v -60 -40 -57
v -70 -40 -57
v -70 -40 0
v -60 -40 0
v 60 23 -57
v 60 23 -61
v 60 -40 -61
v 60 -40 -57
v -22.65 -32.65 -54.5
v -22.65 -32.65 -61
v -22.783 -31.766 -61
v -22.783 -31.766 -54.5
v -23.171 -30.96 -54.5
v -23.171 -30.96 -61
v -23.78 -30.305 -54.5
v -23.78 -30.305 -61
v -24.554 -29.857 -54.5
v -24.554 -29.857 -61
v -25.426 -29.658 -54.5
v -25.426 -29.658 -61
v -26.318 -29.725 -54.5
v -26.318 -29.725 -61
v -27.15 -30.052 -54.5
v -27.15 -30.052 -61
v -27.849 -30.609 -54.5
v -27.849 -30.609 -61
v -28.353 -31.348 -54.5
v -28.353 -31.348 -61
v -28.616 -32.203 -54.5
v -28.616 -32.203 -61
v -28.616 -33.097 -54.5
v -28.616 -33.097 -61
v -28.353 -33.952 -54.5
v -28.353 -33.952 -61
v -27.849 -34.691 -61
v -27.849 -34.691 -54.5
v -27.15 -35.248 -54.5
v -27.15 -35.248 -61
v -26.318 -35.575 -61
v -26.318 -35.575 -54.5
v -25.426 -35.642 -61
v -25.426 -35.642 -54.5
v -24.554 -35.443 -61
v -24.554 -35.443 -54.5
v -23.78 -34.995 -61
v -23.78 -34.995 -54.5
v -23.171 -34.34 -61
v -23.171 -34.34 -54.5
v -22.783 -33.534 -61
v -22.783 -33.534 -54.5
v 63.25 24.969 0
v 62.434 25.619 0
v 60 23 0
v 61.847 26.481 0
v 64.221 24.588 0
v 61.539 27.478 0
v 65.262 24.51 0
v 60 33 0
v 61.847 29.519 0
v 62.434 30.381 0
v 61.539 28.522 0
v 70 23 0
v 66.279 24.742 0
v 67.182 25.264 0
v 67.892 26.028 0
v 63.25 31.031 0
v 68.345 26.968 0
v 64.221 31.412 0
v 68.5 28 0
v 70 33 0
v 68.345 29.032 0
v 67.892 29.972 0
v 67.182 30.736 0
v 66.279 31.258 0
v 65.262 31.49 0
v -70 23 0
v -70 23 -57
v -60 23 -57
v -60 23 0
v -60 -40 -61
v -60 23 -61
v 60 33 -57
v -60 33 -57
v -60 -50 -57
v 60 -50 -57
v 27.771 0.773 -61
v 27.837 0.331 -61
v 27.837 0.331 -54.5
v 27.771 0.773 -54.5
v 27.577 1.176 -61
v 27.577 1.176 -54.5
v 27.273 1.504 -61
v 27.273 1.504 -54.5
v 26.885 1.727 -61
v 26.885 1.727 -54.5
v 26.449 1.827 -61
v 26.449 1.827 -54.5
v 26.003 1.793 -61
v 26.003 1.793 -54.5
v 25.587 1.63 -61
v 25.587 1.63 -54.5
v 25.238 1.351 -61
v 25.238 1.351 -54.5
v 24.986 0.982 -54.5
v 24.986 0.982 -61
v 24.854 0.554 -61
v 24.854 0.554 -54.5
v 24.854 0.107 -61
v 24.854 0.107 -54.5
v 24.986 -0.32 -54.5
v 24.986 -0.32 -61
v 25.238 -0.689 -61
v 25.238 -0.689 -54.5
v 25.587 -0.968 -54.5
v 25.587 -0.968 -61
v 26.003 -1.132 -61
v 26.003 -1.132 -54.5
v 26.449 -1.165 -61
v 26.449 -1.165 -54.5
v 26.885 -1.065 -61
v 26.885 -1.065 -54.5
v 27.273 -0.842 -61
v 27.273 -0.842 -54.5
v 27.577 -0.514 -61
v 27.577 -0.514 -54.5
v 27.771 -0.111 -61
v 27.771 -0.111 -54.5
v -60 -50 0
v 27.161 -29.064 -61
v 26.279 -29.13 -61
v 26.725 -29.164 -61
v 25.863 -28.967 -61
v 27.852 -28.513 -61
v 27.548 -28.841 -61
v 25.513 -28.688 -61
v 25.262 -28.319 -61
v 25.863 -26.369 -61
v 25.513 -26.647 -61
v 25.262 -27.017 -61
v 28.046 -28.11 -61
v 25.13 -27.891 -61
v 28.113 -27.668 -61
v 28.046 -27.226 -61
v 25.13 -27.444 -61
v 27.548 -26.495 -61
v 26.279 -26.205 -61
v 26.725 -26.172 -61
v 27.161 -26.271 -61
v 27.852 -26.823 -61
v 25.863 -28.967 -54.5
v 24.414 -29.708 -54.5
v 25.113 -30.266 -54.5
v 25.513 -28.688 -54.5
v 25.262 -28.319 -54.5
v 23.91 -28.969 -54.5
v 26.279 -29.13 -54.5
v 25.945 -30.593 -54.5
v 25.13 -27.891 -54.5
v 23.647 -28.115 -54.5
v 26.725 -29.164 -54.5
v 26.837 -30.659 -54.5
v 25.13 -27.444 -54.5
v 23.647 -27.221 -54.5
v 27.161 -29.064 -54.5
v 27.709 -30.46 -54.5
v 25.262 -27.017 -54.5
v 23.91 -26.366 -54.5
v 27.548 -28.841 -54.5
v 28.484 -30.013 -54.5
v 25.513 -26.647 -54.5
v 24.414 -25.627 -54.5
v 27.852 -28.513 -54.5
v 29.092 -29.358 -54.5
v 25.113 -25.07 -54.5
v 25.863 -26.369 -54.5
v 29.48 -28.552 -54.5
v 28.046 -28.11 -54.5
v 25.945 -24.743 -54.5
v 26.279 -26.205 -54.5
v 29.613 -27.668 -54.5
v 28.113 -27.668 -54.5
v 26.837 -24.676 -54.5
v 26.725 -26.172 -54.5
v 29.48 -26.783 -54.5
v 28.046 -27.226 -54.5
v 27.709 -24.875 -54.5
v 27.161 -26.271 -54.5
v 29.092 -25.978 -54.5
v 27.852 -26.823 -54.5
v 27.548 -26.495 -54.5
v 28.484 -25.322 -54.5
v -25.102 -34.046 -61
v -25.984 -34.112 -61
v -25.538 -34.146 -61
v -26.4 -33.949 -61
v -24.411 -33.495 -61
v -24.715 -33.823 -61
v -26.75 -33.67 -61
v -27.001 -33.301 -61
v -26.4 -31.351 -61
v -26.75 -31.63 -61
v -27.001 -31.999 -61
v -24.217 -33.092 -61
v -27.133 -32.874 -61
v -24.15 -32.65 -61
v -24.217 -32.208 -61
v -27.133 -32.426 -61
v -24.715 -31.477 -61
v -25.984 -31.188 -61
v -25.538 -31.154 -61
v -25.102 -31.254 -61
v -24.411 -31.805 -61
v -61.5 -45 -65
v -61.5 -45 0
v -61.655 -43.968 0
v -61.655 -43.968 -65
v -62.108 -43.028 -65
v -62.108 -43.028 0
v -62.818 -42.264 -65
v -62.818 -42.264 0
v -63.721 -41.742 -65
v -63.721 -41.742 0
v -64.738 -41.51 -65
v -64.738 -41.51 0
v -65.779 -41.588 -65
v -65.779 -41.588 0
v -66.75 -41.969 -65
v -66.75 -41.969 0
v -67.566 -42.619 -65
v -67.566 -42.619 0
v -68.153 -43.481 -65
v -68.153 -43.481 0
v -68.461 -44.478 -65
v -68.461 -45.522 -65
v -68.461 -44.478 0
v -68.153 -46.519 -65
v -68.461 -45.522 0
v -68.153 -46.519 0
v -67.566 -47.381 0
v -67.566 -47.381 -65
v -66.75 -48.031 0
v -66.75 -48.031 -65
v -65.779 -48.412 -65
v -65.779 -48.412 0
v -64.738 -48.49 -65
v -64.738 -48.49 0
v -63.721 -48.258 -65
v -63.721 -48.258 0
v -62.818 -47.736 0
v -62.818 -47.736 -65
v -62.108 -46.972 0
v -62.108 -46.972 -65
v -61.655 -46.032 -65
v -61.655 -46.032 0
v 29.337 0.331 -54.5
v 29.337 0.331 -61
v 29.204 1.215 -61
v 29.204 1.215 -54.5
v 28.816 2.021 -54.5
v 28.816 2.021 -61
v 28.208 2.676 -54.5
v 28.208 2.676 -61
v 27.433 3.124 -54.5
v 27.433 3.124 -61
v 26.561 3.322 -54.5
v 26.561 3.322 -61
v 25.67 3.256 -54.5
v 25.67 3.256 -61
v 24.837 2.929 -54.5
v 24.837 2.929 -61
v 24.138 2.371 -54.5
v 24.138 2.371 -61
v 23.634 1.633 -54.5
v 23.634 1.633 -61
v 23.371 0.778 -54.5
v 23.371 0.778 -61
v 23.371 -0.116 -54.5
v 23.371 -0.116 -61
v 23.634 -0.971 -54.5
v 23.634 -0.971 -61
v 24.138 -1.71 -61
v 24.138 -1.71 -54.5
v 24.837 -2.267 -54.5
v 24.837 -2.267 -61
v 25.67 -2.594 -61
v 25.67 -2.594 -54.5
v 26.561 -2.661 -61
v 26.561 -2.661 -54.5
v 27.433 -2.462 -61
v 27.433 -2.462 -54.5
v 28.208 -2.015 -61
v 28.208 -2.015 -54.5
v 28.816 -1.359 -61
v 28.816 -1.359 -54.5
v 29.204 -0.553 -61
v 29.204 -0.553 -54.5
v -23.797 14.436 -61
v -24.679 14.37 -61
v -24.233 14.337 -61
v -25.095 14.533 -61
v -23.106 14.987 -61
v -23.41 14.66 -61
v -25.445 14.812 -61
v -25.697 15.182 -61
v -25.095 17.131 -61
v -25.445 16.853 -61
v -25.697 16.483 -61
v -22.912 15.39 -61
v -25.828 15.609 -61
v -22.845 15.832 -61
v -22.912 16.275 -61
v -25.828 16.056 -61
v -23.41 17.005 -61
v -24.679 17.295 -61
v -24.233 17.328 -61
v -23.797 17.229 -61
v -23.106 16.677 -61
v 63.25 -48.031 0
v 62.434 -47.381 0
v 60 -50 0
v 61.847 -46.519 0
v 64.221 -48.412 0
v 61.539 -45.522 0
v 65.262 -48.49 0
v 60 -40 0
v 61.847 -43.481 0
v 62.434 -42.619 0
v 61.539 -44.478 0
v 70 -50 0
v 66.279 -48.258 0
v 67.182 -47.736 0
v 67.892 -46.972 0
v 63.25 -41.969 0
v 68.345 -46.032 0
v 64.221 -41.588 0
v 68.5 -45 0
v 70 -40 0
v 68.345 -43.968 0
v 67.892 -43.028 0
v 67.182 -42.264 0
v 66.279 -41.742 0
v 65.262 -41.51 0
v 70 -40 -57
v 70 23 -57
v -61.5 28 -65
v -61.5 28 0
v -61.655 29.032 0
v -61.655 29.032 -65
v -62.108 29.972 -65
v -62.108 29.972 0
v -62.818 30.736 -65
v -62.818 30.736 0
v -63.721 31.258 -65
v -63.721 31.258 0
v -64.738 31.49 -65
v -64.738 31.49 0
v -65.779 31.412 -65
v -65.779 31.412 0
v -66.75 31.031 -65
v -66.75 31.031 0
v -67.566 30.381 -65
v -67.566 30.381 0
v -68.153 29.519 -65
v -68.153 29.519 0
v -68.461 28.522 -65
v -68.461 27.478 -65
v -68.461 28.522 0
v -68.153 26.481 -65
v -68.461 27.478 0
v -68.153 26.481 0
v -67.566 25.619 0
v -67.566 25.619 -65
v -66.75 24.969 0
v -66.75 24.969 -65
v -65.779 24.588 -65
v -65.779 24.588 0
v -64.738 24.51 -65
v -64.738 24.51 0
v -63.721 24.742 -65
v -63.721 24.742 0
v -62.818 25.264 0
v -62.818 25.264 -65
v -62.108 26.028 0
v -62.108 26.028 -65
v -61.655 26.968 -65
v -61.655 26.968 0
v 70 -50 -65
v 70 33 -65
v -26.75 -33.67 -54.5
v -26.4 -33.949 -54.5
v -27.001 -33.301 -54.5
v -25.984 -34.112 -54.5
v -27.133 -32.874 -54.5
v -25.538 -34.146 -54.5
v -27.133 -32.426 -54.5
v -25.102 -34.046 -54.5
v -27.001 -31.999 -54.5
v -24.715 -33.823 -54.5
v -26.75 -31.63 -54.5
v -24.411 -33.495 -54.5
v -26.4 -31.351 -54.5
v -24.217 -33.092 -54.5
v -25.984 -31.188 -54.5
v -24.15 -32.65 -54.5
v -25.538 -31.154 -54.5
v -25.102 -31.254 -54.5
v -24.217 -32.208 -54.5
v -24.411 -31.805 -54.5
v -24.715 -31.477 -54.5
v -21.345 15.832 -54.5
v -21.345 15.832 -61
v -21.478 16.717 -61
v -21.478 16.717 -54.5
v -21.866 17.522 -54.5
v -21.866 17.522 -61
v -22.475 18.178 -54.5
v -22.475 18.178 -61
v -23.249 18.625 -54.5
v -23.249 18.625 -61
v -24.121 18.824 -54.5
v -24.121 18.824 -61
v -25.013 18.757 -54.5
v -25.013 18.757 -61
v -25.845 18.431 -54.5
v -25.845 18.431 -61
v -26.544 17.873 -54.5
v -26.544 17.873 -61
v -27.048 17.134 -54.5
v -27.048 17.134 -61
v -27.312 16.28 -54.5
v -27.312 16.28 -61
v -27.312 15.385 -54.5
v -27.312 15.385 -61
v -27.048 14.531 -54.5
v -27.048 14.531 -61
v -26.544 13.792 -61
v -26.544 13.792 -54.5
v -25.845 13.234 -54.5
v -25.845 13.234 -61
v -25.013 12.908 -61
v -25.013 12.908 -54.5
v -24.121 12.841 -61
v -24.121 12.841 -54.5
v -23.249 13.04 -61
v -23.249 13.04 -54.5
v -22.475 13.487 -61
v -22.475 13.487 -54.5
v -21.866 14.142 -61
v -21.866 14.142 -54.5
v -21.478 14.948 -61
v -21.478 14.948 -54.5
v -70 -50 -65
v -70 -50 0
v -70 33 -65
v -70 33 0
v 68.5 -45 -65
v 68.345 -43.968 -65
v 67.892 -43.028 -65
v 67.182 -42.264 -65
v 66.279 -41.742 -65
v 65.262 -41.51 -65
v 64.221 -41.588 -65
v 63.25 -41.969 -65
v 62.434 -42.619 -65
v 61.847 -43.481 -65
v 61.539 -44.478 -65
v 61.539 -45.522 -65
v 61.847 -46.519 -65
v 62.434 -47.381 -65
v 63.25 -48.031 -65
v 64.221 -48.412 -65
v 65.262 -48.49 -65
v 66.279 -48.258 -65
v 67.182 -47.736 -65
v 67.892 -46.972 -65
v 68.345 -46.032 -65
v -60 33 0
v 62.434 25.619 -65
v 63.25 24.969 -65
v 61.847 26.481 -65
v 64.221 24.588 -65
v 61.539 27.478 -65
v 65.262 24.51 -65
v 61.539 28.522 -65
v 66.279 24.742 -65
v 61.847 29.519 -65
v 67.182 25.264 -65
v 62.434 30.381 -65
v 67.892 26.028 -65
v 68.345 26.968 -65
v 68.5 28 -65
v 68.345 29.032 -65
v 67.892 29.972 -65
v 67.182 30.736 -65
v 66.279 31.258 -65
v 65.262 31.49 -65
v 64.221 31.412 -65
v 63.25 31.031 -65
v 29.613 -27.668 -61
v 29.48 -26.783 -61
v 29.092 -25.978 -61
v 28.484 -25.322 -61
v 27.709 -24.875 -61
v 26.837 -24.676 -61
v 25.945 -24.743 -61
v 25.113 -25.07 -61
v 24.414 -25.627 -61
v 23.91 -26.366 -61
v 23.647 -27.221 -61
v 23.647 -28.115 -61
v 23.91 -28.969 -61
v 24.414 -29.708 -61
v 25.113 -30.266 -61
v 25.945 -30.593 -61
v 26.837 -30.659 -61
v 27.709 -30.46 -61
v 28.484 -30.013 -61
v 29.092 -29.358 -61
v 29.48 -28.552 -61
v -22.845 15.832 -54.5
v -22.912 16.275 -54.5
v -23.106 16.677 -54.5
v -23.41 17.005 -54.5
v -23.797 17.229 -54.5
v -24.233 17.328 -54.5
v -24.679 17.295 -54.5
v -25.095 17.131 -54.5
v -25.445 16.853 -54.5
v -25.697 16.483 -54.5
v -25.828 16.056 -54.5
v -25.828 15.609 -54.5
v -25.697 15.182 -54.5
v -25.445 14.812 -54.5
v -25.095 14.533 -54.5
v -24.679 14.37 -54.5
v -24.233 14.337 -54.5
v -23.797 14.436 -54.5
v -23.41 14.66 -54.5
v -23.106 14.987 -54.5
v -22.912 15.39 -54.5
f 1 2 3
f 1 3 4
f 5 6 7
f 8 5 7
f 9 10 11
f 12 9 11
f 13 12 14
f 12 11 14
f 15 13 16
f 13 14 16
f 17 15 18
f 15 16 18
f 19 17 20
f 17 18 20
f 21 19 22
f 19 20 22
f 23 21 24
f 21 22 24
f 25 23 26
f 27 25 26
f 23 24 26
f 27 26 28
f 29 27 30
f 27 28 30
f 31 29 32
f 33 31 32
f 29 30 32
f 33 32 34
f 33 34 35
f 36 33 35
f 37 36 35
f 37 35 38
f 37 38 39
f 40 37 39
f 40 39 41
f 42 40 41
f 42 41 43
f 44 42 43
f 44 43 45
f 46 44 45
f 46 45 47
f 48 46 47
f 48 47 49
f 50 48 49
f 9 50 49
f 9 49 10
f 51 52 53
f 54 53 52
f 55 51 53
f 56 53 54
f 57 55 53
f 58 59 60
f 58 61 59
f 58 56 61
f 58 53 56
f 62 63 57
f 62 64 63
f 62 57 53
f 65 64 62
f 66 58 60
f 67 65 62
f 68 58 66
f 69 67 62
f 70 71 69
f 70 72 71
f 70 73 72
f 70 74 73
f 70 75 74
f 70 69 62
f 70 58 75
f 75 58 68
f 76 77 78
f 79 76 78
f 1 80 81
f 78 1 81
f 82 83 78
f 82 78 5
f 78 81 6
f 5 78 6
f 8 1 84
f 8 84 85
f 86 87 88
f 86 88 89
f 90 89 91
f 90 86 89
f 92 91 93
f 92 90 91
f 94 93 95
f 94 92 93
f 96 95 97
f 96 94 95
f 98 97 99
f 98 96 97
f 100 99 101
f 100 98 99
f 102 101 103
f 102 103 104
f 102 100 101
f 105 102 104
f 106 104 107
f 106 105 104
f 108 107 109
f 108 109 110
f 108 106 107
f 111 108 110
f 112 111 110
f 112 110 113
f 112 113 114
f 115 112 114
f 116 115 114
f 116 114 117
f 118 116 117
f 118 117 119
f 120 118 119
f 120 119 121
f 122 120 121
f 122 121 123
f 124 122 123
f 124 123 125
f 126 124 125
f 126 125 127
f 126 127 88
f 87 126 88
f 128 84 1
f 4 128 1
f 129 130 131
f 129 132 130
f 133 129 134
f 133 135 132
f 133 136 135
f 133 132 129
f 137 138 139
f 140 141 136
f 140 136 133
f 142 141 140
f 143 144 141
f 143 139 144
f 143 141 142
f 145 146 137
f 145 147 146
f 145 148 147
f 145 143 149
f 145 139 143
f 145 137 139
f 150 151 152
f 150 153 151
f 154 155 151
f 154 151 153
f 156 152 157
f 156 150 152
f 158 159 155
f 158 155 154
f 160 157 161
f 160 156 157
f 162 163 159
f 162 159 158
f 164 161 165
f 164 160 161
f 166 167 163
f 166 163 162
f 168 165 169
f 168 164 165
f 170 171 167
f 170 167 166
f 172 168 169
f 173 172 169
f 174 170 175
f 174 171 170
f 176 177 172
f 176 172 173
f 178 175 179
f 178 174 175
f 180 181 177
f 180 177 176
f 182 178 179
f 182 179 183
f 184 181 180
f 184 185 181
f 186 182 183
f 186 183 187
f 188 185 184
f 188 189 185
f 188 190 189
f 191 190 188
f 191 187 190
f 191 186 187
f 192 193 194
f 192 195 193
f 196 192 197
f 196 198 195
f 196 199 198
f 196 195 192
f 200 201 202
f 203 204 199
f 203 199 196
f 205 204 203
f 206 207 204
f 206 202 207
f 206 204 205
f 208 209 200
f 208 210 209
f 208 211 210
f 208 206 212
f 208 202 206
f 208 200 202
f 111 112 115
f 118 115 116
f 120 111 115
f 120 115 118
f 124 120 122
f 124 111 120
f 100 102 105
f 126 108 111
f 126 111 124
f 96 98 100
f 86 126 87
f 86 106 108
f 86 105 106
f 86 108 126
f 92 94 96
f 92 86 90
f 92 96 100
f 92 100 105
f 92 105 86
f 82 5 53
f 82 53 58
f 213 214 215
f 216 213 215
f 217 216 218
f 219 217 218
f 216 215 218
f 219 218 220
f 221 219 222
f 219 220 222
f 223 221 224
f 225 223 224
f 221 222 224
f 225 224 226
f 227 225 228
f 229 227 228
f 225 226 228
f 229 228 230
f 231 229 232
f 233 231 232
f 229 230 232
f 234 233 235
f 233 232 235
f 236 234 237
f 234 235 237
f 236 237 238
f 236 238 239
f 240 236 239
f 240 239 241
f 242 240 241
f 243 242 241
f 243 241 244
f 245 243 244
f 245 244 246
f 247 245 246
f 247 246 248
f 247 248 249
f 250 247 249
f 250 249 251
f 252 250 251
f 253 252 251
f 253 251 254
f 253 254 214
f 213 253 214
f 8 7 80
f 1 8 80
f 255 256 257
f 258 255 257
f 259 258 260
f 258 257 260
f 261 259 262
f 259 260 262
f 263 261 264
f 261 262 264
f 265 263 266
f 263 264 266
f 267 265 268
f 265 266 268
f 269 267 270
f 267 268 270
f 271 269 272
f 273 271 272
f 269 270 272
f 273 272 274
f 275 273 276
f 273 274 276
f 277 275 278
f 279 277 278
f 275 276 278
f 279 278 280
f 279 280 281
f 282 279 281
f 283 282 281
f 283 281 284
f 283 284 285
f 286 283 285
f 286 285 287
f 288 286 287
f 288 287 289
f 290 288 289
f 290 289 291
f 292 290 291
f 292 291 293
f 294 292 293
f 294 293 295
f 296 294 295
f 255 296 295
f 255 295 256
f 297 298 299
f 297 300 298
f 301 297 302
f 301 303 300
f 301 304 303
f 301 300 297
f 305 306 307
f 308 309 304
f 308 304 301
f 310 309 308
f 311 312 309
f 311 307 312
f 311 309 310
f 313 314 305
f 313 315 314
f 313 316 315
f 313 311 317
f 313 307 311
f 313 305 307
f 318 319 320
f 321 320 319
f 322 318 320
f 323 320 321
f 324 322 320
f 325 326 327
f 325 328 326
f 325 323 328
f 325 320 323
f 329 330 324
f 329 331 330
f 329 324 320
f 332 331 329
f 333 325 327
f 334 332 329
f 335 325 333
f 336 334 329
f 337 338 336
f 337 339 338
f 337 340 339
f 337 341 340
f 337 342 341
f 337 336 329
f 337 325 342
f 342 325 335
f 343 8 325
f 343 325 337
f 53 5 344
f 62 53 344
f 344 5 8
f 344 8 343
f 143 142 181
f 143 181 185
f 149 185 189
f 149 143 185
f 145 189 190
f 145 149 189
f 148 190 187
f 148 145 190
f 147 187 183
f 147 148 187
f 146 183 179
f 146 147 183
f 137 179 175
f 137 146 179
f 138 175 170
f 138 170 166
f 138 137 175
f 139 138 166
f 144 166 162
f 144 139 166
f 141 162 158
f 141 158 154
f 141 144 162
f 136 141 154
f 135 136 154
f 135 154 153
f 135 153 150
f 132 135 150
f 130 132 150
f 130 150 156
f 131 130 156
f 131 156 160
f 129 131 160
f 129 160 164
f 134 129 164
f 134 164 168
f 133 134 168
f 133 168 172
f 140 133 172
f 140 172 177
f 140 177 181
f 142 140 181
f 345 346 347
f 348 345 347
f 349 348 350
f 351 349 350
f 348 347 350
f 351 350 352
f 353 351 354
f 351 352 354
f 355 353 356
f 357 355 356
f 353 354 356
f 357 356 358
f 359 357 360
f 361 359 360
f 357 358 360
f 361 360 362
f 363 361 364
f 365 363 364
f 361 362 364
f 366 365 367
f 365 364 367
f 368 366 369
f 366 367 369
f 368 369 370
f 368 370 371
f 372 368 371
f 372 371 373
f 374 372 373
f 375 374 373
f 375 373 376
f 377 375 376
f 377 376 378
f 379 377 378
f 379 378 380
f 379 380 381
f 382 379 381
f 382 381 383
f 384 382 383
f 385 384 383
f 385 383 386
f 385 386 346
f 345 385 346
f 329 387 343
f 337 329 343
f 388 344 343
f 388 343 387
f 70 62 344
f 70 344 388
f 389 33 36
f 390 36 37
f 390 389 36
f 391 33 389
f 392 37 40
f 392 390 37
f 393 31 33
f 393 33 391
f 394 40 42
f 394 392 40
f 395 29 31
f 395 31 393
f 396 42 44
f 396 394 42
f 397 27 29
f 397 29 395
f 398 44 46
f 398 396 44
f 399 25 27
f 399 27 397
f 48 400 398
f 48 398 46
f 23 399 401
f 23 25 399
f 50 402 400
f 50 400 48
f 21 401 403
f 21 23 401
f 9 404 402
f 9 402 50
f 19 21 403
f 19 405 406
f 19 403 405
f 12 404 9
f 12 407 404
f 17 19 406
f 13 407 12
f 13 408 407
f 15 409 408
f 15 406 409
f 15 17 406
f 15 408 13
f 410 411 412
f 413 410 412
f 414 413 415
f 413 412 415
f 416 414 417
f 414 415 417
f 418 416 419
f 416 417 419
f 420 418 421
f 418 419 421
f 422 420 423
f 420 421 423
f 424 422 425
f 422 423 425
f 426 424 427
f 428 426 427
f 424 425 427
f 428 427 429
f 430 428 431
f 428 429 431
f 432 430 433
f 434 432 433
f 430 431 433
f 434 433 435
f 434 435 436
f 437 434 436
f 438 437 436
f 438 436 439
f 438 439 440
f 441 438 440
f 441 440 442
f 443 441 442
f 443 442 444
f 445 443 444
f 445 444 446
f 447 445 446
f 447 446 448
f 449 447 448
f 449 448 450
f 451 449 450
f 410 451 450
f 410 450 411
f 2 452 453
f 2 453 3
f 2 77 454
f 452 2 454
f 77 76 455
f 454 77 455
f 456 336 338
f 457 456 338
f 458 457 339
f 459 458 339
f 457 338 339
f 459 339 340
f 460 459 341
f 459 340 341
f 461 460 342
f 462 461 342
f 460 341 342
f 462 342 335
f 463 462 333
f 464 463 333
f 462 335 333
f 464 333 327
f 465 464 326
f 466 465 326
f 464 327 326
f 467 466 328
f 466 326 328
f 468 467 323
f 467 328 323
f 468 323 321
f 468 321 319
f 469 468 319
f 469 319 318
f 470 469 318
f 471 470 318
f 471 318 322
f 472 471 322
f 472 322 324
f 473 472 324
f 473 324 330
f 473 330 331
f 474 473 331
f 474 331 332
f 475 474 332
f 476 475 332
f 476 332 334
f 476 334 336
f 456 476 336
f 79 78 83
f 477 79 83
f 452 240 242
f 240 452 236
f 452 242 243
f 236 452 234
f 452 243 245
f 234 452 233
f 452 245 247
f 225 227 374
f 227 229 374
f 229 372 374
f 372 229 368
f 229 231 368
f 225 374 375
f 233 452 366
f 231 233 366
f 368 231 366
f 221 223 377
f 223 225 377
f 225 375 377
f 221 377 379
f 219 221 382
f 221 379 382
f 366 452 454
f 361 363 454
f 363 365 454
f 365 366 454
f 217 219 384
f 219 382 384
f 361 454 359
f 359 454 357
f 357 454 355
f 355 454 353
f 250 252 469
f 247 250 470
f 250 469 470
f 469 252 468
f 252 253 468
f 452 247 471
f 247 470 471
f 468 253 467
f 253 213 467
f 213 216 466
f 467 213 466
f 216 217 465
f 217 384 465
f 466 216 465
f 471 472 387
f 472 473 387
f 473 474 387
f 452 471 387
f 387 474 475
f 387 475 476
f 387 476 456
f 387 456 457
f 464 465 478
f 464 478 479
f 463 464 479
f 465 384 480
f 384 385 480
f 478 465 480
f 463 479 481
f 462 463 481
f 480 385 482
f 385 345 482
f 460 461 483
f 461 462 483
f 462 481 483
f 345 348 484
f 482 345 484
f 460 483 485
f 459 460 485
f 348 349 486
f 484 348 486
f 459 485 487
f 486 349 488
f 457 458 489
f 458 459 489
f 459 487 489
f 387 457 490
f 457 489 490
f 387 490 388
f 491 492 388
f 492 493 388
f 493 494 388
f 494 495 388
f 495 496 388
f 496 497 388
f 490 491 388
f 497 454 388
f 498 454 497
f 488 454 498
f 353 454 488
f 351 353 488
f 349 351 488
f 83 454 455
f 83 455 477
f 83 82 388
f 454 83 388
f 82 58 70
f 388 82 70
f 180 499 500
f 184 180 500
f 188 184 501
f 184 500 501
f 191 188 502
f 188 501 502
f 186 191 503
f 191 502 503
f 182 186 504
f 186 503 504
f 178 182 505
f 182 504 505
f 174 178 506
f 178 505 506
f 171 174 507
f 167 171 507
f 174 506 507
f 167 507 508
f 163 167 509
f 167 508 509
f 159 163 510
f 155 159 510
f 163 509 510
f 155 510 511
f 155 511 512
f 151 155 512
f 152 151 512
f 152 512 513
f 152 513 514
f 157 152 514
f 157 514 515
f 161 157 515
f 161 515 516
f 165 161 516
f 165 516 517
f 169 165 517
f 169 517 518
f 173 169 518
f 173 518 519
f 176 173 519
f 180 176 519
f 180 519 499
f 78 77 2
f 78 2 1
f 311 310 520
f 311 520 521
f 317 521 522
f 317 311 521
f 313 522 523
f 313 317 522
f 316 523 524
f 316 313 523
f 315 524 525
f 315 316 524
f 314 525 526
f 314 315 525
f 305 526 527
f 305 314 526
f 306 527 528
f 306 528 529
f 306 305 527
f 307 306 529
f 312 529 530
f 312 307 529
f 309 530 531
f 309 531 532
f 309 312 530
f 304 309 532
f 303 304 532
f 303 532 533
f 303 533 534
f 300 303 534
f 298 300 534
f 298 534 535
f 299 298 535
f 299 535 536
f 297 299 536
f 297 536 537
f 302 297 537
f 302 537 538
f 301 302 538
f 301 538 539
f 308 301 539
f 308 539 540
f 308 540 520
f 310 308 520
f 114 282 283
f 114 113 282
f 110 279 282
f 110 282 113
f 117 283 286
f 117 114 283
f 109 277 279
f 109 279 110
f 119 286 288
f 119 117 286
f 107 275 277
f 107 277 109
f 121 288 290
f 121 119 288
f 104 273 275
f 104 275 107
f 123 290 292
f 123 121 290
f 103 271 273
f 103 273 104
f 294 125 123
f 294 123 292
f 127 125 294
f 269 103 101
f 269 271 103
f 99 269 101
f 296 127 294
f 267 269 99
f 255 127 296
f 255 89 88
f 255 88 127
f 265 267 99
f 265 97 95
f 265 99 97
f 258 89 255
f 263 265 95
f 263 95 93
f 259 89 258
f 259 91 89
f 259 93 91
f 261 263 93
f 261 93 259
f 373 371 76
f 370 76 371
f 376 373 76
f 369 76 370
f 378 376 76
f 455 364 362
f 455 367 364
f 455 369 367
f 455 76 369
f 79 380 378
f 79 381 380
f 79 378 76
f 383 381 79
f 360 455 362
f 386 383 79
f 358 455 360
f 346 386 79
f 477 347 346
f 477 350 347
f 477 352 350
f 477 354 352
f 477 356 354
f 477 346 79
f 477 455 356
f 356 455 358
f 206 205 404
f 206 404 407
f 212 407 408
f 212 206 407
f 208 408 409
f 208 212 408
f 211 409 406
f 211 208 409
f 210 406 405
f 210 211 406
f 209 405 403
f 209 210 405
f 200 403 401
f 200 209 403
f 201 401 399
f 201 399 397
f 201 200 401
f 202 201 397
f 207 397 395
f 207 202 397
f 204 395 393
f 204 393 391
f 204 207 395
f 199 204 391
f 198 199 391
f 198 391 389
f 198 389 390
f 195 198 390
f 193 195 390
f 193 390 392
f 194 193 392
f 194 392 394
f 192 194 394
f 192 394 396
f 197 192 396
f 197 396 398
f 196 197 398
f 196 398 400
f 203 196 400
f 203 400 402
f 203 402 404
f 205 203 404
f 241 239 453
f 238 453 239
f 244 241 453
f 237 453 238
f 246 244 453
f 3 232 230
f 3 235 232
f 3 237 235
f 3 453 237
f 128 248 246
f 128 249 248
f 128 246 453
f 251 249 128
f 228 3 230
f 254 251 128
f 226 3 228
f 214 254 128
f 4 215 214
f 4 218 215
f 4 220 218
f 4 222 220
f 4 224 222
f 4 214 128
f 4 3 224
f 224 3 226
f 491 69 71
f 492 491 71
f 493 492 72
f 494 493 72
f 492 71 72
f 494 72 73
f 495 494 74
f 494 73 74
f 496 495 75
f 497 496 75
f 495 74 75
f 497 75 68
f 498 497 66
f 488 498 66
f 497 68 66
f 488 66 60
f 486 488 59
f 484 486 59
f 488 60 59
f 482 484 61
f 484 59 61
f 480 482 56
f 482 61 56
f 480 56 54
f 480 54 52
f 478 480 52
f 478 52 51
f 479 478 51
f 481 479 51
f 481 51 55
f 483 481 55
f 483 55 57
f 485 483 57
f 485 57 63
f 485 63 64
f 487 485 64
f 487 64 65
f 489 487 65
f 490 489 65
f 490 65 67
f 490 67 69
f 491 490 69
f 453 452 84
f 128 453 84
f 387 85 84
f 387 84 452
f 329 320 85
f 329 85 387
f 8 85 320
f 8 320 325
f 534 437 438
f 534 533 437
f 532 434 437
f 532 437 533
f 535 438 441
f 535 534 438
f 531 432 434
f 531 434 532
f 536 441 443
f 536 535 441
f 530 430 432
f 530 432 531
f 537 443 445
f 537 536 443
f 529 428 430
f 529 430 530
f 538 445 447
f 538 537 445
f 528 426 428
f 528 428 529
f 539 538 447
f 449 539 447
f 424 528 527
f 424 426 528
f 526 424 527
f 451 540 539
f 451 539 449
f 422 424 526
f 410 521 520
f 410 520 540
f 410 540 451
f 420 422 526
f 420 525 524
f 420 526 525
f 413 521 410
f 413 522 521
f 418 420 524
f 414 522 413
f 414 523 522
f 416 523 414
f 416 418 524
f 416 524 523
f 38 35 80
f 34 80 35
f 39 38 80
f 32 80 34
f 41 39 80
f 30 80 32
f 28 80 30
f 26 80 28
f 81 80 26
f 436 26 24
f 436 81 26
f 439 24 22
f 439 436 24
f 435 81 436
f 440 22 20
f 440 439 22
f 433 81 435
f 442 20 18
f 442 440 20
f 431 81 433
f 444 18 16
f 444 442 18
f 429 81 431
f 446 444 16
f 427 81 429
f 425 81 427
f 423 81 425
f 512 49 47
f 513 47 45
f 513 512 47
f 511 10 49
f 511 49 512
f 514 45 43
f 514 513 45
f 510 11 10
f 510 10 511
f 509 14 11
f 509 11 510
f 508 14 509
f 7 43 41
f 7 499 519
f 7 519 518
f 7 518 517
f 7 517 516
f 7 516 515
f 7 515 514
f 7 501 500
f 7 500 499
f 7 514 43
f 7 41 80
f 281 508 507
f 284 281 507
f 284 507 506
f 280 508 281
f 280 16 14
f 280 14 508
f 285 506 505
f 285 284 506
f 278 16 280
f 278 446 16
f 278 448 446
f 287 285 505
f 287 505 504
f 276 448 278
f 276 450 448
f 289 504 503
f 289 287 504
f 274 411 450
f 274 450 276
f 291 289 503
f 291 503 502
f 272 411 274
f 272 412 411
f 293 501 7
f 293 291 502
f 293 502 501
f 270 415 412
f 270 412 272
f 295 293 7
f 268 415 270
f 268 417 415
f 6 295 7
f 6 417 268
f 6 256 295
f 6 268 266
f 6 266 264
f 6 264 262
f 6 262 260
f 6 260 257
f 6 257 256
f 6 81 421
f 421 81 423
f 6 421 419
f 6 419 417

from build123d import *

# Parameters (mm, degrees)
F0_W      = 10
F0_H      = 10
F1_DEPTH  = 65
F4_DEPTH  = 8
F5_W      = 140
F5_H      = 83
F6_DEPTH  = 4
F7_R      = 3
F7_R_2    = 1.5
F8_DEPTH  = 10.5
F9_R      = 3.5
F10_DEPTH = 70


with BuildPart() as f1:
    # F0 (on Top) → F1 (new body)
    with BuildSketch(Plane.XY):
        with Locations((-65, 28)):
            Rectangle(F0_W, F0_H)
        with Locations((65, 28)):
            Rectangle(F0_W, F0_H)
        with Locations((-65, -45)):
            Rectangle(F0_W, F0_H)
        with Locations((65, -45)):
            Rectangle(F0_W, F0_H)
    extrude(amount=-F1_DEPTH)

    # F3 (on offset) → F4 (join)
    with BuildSketch(Plane.XY.offset(-65)):
        Polygon((-70, -40), (-70, -50), (-60, -50), (60, -50), (70, -50), (70, -40), (70, 23), (60, 23), (60, -40), (-60, -40), (-60, 23), (-70, 23), align=None)
        Polygon((-70, 33), (-70, 23), (-60, 23), (60, 23), (70, 23), (70, 33), align=None)
    extrude(amount=F4_DEPTH)

    # F5 (on offset) → F6 (join)
    with BuildSketch(Plane.XY.offset(-65)):
        with Locations((0, -8.5)):
            Rectangle(F5_W, F5_H)
    extrude(amount=F6_DEPTH)

    # F7 (on offset) → F8 (join)
    with BuildSketch(Plane.XY.offset(-65)):
        with Locations((-24.34509, 15.832442)):
            Circle(F7_R)
        with Locations((-24.34509, 15.832442)):
            Circle(F7_R_2, mode=Mode.SUBTRACT)
        with Locations((26.337272, 0.330886)):
            Circle(F7_R)
        with Locations((26.337272, 0.330886)):
            Circle(F7_R_2, mode=Mode.SUBTRACT)
        with Locations((26.613058, -27.667755)):
            Circle(F7_R)
        with Locations((26.613058, -27.667755)):
            Circle(F7_R_2, mode=Mode.SUBTRACT)
        with Locations((-25.65, -32.65)):
            Circle(F7_R)
        with Locations((-25.65, -32.65)):
            Circle(F7_R_2, mode=Mode.SUBTRACT)
    extrude(amount=F8_DEPTH)

    # F9 (on Top) → F10 (cut)
    with BuildSketch(Plane.XY):
        with Locations((-65, 28)):
            Circle(F9_R)
        with Locations((-65, -45)):
            Circle(F9_R)
        with Locations((65, -45)):
            Circle(F9_R)
        with Locations((65, 28)):
            Circle(F9_R)
    extrude(amount=-F10_DEPTH, mode=Mode.SUBTRACT)


solid = f1.part
